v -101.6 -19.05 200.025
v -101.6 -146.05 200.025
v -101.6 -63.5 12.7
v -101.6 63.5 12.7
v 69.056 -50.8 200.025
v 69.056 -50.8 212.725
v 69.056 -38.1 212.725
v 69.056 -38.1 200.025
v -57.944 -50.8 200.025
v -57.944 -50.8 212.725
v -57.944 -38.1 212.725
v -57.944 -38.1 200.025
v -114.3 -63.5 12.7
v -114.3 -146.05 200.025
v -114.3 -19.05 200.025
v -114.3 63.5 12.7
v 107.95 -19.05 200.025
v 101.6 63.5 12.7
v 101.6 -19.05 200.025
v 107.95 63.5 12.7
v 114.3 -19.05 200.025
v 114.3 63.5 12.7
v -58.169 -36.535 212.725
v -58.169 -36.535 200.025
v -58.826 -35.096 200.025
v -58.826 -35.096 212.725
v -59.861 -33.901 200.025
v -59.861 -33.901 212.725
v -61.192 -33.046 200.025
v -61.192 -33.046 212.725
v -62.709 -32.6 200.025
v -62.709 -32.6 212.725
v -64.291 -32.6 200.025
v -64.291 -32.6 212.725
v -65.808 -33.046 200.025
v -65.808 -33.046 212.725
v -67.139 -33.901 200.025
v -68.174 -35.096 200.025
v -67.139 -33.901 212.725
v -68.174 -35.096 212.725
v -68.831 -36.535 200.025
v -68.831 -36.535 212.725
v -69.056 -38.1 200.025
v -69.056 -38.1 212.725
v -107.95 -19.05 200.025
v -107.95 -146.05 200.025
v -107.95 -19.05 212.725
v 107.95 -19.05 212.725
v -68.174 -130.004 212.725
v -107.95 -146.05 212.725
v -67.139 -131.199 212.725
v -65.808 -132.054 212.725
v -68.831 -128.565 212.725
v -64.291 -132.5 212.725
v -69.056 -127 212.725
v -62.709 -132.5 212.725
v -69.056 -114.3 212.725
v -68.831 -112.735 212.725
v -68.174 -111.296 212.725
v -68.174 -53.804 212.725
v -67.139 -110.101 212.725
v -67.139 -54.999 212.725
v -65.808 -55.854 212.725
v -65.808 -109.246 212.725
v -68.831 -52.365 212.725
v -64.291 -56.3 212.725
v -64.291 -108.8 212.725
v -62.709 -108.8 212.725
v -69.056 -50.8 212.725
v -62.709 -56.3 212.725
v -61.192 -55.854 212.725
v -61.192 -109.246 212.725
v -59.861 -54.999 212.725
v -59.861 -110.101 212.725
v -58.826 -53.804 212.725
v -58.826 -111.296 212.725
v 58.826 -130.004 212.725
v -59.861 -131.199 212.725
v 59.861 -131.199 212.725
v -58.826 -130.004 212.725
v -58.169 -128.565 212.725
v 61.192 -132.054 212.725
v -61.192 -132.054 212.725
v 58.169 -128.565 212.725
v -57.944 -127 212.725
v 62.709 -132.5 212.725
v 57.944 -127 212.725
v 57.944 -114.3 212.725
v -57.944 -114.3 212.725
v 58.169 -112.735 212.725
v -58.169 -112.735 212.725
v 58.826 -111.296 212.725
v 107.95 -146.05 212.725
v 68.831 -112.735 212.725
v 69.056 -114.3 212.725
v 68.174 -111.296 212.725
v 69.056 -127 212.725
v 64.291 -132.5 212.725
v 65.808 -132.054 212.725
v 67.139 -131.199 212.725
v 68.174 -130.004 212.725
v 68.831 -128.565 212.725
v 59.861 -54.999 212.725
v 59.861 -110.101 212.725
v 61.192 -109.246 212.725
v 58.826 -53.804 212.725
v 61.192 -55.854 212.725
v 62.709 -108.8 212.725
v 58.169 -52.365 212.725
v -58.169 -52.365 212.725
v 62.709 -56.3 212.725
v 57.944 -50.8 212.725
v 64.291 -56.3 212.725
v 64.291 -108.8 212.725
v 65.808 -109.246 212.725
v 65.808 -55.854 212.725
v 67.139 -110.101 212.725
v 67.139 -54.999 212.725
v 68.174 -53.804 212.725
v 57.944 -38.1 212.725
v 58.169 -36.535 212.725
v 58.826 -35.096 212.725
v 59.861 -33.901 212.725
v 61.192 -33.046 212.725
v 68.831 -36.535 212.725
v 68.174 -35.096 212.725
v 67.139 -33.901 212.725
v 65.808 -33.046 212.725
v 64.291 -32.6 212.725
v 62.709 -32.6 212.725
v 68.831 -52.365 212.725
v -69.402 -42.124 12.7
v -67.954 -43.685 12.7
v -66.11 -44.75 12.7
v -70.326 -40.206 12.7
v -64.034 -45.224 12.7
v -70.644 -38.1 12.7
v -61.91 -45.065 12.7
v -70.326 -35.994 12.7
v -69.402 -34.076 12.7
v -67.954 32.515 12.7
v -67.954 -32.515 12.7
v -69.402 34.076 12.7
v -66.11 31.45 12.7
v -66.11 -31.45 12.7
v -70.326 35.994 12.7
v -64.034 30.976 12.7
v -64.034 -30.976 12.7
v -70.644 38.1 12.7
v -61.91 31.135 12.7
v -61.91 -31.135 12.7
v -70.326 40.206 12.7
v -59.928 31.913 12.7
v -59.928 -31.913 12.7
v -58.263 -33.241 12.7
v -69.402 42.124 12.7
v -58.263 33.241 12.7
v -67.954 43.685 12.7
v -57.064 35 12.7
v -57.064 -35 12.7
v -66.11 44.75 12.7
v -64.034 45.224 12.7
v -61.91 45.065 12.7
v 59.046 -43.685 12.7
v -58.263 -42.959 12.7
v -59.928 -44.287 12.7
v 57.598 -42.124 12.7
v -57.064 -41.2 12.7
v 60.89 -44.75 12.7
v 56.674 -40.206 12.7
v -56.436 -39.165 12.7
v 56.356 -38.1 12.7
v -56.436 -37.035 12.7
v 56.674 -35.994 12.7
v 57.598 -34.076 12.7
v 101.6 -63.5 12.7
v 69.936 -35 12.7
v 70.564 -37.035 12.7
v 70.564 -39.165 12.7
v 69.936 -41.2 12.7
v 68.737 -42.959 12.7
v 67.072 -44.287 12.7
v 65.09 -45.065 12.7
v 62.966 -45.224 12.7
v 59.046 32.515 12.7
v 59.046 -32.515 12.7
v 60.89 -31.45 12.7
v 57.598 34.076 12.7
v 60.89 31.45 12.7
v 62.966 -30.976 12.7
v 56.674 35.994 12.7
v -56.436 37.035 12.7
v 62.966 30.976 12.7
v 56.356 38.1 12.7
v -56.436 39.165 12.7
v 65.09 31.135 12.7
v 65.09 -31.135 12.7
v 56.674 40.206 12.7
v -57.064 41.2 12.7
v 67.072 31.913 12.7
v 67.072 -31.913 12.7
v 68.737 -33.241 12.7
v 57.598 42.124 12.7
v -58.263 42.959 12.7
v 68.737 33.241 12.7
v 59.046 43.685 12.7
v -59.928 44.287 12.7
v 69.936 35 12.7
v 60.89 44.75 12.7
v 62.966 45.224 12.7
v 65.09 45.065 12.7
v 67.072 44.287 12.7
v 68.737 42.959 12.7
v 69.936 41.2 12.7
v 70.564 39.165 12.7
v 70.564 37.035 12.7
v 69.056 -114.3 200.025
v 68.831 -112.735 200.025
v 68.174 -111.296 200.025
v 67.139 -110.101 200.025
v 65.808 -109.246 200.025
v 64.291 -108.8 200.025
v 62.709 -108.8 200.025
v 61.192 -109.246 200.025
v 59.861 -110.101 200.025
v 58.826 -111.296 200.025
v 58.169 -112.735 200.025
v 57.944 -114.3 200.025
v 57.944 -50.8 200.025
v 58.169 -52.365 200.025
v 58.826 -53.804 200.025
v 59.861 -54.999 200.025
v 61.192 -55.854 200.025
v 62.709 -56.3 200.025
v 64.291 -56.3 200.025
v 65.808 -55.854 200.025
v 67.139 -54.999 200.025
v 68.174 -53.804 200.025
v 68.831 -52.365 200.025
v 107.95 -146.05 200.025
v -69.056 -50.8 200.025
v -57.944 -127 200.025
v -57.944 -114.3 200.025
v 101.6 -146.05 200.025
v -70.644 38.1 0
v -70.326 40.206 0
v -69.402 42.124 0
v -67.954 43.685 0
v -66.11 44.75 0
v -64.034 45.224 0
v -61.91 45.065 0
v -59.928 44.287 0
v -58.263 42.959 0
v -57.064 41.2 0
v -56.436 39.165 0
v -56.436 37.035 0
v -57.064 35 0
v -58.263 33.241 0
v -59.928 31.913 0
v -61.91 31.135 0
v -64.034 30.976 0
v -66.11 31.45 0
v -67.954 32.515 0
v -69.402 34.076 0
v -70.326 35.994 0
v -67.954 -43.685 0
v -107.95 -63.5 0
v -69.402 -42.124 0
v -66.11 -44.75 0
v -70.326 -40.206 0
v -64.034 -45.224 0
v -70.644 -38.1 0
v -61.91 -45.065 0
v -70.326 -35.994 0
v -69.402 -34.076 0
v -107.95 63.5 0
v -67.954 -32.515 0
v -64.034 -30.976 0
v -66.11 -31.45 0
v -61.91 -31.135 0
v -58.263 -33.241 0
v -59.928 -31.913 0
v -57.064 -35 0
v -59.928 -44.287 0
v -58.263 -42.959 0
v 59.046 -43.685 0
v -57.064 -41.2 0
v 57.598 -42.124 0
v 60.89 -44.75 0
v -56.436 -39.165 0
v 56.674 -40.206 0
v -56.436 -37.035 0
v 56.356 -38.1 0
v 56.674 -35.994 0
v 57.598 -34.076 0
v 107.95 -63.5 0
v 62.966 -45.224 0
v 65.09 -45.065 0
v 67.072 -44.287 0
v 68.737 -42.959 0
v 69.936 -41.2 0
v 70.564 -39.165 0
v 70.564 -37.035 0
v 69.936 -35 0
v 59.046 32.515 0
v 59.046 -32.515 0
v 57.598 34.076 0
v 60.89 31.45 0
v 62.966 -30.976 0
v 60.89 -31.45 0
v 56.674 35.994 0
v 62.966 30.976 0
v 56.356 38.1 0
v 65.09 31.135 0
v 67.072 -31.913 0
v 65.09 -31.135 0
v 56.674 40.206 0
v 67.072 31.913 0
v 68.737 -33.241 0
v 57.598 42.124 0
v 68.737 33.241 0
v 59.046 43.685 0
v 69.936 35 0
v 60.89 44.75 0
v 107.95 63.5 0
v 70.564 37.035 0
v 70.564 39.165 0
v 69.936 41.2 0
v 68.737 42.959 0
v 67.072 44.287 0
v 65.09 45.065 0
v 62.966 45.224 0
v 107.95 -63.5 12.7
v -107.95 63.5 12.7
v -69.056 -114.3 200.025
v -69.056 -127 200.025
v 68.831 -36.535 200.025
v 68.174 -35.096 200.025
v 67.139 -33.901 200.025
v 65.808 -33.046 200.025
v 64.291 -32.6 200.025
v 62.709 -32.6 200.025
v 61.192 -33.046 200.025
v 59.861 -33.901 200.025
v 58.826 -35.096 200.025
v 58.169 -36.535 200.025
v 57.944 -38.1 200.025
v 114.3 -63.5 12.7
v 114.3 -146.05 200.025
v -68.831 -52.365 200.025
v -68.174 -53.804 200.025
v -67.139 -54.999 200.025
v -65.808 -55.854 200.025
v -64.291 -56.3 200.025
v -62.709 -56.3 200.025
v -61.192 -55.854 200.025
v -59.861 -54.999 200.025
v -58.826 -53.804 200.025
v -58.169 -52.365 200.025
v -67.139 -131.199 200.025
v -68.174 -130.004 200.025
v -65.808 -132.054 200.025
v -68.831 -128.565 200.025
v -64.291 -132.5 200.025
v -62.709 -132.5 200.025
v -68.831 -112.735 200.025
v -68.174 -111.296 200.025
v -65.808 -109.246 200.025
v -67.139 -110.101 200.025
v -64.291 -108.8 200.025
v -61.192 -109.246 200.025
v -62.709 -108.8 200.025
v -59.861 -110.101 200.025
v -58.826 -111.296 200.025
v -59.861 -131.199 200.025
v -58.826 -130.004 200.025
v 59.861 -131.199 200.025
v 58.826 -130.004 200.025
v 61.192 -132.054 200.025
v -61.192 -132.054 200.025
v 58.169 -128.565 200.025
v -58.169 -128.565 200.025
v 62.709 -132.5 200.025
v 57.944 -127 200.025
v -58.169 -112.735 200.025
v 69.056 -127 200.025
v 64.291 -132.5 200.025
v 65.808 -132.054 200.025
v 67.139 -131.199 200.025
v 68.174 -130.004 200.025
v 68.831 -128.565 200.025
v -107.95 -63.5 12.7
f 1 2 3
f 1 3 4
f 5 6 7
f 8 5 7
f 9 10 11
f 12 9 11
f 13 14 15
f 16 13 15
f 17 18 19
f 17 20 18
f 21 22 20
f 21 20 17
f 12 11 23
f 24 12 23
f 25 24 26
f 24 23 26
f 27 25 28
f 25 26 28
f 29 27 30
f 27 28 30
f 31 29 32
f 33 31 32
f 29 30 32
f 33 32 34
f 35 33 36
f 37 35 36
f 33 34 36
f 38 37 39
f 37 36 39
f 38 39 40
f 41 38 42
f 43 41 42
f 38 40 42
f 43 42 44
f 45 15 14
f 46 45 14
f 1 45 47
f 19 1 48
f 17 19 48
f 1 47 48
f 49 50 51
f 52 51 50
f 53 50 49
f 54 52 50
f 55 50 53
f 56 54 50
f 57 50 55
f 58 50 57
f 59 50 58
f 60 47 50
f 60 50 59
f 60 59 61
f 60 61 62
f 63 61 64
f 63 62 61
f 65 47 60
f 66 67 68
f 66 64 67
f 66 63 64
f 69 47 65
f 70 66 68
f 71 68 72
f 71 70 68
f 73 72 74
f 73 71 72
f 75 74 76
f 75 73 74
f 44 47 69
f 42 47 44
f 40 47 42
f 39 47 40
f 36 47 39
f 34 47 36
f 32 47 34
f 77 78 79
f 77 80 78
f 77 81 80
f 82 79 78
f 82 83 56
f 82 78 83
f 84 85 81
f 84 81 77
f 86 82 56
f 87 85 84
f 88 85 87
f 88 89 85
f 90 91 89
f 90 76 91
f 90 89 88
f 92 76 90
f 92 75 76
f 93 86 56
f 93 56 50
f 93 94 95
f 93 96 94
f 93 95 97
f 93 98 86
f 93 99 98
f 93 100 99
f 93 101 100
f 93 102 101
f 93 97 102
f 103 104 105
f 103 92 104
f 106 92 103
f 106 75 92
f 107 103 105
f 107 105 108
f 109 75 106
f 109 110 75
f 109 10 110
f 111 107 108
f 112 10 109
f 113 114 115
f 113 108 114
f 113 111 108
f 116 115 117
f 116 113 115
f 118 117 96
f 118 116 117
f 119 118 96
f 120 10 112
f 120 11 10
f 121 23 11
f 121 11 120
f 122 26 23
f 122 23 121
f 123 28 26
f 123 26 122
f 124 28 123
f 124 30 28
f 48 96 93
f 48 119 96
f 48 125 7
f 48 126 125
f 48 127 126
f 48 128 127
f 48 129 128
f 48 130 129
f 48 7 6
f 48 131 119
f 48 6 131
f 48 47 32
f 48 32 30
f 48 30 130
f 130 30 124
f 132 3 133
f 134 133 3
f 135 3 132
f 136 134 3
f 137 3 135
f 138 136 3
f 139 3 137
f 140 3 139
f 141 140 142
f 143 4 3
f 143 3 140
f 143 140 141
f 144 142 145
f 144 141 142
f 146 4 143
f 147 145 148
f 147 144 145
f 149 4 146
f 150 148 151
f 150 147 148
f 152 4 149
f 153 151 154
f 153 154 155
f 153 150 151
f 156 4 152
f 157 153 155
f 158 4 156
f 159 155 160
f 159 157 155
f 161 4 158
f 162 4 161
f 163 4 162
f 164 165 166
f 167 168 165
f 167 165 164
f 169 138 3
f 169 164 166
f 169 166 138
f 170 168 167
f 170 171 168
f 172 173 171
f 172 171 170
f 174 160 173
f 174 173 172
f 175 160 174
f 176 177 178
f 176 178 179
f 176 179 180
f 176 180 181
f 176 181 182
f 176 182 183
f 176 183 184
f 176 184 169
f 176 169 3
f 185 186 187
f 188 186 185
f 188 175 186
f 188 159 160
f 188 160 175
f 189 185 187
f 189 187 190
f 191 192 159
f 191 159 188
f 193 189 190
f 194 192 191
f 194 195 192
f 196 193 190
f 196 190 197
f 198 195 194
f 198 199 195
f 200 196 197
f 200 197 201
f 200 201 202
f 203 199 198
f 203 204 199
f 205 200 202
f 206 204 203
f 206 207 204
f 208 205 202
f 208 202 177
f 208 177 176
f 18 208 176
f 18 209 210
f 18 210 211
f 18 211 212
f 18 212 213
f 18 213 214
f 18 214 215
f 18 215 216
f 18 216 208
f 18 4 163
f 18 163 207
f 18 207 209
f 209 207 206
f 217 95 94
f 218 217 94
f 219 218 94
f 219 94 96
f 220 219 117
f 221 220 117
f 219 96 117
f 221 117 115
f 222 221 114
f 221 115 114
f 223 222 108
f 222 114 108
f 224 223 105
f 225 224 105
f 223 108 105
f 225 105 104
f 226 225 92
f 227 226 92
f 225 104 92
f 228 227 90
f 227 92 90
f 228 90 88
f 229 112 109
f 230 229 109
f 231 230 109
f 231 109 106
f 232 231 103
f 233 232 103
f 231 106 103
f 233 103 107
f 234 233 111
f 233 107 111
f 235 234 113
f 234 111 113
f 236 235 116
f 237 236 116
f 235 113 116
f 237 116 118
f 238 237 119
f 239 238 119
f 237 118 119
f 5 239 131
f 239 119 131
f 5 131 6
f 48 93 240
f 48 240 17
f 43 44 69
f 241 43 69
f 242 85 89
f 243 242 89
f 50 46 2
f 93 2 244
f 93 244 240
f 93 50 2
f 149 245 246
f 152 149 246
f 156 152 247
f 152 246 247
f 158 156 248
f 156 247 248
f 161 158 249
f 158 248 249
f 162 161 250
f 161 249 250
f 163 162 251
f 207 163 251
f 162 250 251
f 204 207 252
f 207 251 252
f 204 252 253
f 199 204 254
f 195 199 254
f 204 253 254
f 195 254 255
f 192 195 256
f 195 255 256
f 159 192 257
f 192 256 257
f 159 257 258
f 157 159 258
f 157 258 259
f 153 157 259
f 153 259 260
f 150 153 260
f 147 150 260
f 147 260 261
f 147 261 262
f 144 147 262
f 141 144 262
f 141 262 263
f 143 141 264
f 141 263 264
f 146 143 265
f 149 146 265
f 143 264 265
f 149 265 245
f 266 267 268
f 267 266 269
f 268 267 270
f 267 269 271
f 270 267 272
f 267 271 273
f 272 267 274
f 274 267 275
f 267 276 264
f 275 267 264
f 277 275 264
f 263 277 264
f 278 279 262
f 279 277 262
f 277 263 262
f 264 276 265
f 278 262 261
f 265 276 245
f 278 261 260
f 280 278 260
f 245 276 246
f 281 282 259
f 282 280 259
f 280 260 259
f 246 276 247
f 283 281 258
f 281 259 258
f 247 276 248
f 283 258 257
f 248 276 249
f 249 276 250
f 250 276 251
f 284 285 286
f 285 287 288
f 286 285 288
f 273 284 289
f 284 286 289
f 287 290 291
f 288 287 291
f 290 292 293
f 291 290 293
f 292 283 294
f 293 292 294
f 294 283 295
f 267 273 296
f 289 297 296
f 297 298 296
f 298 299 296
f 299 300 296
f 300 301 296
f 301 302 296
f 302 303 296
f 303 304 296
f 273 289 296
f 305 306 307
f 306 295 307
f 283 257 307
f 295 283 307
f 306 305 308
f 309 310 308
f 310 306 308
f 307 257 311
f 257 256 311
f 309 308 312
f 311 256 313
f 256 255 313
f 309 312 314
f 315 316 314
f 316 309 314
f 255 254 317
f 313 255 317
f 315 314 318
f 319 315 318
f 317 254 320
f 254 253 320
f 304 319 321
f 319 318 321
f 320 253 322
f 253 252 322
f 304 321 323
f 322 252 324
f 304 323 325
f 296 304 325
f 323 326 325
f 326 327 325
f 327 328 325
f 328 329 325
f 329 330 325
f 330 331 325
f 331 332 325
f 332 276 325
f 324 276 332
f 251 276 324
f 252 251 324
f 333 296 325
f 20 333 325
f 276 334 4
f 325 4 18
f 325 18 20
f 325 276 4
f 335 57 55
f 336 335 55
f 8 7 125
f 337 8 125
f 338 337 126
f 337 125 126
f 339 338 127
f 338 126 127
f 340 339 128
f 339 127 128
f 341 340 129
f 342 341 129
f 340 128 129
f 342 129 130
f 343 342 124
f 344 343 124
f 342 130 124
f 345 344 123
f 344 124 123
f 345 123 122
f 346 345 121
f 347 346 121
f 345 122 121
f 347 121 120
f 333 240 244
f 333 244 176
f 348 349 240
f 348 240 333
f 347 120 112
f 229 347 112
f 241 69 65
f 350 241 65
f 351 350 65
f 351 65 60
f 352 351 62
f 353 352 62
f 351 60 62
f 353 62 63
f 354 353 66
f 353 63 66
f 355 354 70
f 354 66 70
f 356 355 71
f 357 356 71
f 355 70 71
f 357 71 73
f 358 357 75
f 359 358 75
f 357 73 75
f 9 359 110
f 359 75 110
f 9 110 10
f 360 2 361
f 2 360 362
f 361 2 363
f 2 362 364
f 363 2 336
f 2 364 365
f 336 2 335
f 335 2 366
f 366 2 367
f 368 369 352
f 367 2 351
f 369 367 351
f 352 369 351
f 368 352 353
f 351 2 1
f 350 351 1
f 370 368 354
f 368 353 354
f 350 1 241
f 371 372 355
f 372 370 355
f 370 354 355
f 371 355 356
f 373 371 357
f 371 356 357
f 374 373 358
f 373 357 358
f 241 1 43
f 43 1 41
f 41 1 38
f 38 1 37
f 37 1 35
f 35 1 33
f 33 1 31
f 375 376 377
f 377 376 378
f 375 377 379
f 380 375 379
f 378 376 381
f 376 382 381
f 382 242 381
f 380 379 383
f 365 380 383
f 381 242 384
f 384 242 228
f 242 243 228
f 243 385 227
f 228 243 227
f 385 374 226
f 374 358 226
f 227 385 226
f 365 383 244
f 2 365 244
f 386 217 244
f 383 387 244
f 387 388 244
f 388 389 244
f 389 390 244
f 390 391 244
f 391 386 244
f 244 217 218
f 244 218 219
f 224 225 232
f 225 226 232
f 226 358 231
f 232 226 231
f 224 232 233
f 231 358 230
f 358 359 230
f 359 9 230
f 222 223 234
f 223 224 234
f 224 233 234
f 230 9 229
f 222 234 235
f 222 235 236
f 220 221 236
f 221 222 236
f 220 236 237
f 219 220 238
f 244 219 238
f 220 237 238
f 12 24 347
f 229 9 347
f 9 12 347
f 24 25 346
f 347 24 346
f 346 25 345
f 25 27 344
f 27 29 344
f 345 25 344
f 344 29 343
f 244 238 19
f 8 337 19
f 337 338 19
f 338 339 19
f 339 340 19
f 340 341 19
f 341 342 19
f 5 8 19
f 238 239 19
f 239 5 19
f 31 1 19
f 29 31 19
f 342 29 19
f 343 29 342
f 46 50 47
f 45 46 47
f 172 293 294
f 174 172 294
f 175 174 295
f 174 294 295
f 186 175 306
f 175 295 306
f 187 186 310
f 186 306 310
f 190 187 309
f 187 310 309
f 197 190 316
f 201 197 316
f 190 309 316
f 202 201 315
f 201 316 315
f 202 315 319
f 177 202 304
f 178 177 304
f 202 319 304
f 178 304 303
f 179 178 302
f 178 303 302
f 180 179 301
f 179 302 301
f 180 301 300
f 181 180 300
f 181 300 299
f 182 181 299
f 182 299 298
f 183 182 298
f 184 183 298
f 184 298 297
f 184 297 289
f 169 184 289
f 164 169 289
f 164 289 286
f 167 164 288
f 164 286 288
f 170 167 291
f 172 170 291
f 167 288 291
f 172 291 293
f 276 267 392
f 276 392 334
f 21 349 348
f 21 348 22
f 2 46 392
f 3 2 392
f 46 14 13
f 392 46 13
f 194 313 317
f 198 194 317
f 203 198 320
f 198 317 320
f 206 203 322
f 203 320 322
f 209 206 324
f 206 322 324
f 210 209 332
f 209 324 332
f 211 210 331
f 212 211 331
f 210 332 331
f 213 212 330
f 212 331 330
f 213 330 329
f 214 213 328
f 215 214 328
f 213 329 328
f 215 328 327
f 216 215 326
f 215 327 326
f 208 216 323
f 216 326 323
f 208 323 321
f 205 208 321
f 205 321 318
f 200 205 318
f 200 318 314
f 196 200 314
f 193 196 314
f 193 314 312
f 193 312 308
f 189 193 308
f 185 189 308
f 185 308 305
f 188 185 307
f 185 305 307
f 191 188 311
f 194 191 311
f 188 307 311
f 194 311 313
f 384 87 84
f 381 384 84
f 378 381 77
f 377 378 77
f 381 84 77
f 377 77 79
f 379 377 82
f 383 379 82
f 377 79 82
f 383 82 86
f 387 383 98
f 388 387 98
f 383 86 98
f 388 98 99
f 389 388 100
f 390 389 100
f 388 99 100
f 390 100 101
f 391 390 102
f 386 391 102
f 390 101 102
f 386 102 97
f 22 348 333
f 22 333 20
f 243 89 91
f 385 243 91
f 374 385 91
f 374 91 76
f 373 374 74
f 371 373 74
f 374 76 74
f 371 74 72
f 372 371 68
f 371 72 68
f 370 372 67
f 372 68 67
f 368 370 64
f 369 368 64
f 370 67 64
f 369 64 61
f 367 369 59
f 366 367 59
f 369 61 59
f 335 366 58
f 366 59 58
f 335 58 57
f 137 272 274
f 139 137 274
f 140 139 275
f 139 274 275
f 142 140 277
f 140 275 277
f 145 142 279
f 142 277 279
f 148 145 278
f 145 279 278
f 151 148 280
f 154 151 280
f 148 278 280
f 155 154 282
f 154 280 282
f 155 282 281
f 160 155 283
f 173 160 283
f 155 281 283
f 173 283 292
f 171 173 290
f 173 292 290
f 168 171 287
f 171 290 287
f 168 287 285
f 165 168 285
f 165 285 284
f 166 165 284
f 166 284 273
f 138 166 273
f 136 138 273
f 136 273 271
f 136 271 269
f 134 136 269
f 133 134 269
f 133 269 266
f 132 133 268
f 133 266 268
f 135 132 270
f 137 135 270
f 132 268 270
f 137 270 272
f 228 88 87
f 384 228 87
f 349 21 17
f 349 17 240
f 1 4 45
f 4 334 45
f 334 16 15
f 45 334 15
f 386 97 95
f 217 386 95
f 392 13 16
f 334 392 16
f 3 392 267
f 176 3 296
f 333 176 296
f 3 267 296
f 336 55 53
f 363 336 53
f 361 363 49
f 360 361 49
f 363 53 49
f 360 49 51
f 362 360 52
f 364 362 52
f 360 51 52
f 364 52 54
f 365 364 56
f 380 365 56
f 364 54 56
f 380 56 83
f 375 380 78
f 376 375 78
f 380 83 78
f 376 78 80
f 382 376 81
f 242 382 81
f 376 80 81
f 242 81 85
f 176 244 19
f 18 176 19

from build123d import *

# Parameters (mm, degrees)
F0_W      = 215.9
F0_H      = 127
F1_DEPTH  = 12.7
F3_D      = 14.2875
F5_W      = 215.9
F5_H      = 127
F6_DEPTH  = 12.7
F8_DEPTH  = 212.726
F10_DEPTH = 6.35


# Not quite as in the source:
# - a length typed as a fraction of an inch, garbled in the dataset ("3 / 203.2 mm" for 3/8 in), is restored


with BuildPart() as f1:
    # F0 (on Top) → F1 (new body)
    with BuildSketch(Plane.XY):
        Rectangle(F0_W, F0_H)
    extrude(amount=F1_DEPTH)

    # F3 (through all)
    with Locations(Plane.XY.offset(12.7)):
        with Locations((-63.5, 38.1), (63.5, 38.1), (63.5, -38.1), (-63.5, -38.1)):
            Hole(F3_D / 2)



with BuildPart() as f6:
    # F5 (on offset) → F6 (new body)
    with BuildSketch(Plane.XY.offset(212.725)):
        with Locations((0, -82.55)):
            Rectangle(F5_W, F5_H)
    extrude(amount=-F6_DEPTH)

    # F7 (on face) → F8 (cut, through all)
    with BuildSketch(Plane.XY.offset(212.725)):
        with BuildLine():
            ThreePointArc((-57.94375, -38.1), (-63.5, -32.54375), (-69.05625, -38.1))
            Line((-69.05625, -38.1), (-69.05625, -50.8))
            ThreePointArc((-69.05625, -50.8), (-63.5, -56.35625), (-57.94375, -50.8))
            Line((-57.94375, -50.8), (-57.94375, -38.1))
        make_face()
        with BuildLine():
            ThreePointArc((-57.94375, -114.3), (-63.5, -108.74375), (-69.05625, -114.3))
            Line((-69.05625, -114.3), (-69.05625, -127))
            ThreePointArc((-69.05625, -127), (-63.5, -132.55625), (-57.94375, -127))
            Line((-57.94375, -127), (-57.94375, -114.3))
        make_face()
        with BuildLine():
            ThreePointArc((69.05625, -38.1), (63.5, -32.54375), (57.94375, -38.1))
            Line((57.94375, -38.1), (57.94375, -50.8))
            ThreePointArc((57.94375, -50.8), (63.5, -56.35625), (69.05625, -50.8))
            Line((69.05625, -50.8), (69.05625, -38.1))
        make_face()
        with BuildLine():
            ThreePointArc((69.05625, -114.3), (63.5, -108.74375), (57.94375, -114.3))
            Line((57.94375, -114.3), (57.94375, -127))
            ThreePointArc((57.94375, -127), (63.5, -132.55625), (69.05625, -127))
            Line((69.05625, -127), (69.05625, -114.3))
        make_face()
    extrude(amount=-F8_DEPTH, mode=Mode.SUBTRACT)


with BuildPart() as f1_1:
    add(f1.part)

    add(f6.part)  # F10 merges F6
    # F9 (on face) → F10 (join, symmetric)
    with BuildSketch(Plane.YZ.offset(107.95)):
        Polygon((63.5, 12.7), (-19.05, 200.025), (-146.05, 200.025), (-63.5, 12.7), align=None)
    extrude(amount=F10_DEPTH, both=True)

    # F11: F1 across plane


with BuildPart() as f1_2:
    add(f1_1.part)
    add(f1_1.part.mirror(Plane.YZ))


solid = f1_2.part
